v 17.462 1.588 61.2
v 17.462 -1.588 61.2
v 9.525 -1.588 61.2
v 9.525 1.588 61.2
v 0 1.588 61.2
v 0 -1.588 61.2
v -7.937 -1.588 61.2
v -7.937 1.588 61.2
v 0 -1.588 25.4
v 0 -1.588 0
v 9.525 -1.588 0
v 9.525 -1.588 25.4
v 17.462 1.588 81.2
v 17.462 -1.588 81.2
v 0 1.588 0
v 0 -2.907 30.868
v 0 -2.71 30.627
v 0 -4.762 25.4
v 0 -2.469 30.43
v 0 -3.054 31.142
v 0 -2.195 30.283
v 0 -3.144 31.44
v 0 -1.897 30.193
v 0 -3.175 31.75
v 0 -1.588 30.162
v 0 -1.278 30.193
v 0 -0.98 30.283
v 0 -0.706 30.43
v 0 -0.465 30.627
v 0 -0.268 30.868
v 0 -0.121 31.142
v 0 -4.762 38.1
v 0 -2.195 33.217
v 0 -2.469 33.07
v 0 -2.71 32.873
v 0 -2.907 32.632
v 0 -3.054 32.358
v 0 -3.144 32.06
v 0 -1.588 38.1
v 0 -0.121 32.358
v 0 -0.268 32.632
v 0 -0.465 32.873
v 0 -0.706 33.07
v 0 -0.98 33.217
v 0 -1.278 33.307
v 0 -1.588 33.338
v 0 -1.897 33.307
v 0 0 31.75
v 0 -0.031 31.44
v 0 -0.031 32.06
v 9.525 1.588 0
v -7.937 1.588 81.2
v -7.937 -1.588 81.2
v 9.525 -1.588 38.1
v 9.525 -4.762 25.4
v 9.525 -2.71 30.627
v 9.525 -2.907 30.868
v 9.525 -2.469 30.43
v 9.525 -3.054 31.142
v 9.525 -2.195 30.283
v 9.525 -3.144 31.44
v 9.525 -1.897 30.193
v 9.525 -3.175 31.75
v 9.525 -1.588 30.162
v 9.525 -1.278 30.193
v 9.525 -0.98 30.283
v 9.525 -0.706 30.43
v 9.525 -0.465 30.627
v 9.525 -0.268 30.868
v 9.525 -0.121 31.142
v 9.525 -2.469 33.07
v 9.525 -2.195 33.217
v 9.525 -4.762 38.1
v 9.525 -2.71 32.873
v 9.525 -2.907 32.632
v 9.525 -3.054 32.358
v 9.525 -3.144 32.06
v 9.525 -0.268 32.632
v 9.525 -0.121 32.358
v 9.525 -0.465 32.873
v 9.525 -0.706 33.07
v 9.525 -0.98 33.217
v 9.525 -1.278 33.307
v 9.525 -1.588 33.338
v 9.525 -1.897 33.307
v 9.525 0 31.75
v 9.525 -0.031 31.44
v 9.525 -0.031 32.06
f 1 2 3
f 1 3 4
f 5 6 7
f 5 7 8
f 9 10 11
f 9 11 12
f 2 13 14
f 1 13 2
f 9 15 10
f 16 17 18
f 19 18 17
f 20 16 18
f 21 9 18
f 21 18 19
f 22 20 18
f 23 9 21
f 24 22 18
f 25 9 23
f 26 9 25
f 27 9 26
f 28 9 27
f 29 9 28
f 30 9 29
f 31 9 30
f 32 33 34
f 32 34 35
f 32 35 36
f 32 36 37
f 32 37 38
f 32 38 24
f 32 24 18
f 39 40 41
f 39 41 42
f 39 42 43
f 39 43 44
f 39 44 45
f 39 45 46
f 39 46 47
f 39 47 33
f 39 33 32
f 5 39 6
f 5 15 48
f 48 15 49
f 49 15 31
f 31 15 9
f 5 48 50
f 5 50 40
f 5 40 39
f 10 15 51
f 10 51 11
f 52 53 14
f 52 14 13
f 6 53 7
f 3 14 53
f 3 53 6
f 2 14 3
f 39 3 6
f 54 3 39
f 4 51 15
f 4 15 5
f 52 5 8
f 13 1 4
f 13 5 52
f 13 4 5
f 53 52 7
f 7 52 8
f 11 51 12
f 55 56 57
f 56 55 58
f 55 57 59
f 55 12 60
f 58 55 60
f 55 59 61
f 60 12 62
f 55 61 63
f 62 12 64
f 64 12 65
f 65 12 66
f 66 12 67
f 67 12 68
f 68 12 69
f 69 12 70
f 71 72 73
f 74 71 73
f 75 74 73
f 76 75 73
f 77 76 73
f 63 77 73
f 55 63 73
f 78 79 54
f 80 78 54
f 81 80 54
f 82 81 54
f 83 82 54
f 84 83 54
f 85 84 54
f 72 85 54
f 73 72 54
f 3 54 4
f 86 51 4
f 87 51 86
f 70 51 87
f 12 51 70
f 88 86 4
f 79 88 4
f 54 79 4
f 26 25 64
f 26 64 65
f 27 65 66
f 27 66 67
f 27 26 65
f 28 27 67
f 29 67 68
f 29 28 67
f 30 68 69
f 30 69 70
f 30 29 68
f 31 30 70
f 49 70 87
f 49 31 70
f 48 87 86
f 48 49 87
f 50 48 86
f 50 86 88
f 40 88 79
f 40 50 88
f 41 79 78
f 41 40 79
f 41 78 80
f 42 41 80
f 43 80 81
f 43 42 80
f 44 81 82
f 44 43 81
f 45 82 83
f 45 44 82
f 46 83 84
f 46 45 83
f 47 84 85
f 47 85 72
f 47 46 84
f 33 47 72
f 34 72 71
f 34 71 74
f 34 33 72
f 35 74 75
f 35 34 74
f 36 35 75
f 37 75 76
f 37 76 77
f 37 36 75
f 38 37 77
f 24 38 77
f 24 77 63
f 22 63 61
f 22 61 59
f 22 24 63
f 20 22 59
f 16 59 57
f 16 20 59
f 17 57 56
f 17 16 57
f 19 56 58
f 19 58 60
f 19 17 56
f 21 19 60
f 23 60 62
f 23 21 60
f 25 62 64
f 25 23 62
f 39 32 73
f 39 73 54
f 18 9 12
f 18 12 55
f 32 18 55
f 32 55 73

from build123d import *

# Parameters (mm, degrees)
SKETCH1_R           = 1.5875
BOSS_EXTRUDE1_DEPTH = 9.525
SKETCH3_W           = 15
SKETCH3_H           = 3.175
SKETCH3_W_2         = 5
BOSS_EXTRUDE2_DEPTH = 12.7


with BuildPart() as part:
    # Sketch1 → Boss-Extrude1 (new body)
    with BuildSketch(Plane(origin=(0, 0, 0), x_dir=(0, 0, -1), z_dir=(1, 0, 0))):
        Polygon((0, 1.5875), (0, -1.5875), (-25.4, -1.5875), (-25.4, -4.7625), (-38.1, -4.7625), (-38.1, -1.5875), (-76.2, -1.5875), (-76.2, 1.5875), align=None)
        with Locations((-31.75, -1.5875)):
            Circle(SKETCH1_R, mode=Mode.SUBTRACT)
    extrude(amount=BOSS_EXTRUDE1_DEPTH)

    # Sketch3 → Boss-Extrude2 (add, symmetric)
    with BuildSketch(Plane(origin=(4.7625, 0, 0), x_dir=(0, 0, -1), z_dir=(1, 0, 0))):
        with Locations((-68.7, 0)):
            Rectangle(SKETCH3_W, SKETCH3_H)
        with Locations((-78.7, 0)):
            Rectangle(SKETCH3_W_2, SKETCH3_H)
    extrude(amount=BOSS_EXTRUDE2_DEPTH, both=True)


solid = part.part
